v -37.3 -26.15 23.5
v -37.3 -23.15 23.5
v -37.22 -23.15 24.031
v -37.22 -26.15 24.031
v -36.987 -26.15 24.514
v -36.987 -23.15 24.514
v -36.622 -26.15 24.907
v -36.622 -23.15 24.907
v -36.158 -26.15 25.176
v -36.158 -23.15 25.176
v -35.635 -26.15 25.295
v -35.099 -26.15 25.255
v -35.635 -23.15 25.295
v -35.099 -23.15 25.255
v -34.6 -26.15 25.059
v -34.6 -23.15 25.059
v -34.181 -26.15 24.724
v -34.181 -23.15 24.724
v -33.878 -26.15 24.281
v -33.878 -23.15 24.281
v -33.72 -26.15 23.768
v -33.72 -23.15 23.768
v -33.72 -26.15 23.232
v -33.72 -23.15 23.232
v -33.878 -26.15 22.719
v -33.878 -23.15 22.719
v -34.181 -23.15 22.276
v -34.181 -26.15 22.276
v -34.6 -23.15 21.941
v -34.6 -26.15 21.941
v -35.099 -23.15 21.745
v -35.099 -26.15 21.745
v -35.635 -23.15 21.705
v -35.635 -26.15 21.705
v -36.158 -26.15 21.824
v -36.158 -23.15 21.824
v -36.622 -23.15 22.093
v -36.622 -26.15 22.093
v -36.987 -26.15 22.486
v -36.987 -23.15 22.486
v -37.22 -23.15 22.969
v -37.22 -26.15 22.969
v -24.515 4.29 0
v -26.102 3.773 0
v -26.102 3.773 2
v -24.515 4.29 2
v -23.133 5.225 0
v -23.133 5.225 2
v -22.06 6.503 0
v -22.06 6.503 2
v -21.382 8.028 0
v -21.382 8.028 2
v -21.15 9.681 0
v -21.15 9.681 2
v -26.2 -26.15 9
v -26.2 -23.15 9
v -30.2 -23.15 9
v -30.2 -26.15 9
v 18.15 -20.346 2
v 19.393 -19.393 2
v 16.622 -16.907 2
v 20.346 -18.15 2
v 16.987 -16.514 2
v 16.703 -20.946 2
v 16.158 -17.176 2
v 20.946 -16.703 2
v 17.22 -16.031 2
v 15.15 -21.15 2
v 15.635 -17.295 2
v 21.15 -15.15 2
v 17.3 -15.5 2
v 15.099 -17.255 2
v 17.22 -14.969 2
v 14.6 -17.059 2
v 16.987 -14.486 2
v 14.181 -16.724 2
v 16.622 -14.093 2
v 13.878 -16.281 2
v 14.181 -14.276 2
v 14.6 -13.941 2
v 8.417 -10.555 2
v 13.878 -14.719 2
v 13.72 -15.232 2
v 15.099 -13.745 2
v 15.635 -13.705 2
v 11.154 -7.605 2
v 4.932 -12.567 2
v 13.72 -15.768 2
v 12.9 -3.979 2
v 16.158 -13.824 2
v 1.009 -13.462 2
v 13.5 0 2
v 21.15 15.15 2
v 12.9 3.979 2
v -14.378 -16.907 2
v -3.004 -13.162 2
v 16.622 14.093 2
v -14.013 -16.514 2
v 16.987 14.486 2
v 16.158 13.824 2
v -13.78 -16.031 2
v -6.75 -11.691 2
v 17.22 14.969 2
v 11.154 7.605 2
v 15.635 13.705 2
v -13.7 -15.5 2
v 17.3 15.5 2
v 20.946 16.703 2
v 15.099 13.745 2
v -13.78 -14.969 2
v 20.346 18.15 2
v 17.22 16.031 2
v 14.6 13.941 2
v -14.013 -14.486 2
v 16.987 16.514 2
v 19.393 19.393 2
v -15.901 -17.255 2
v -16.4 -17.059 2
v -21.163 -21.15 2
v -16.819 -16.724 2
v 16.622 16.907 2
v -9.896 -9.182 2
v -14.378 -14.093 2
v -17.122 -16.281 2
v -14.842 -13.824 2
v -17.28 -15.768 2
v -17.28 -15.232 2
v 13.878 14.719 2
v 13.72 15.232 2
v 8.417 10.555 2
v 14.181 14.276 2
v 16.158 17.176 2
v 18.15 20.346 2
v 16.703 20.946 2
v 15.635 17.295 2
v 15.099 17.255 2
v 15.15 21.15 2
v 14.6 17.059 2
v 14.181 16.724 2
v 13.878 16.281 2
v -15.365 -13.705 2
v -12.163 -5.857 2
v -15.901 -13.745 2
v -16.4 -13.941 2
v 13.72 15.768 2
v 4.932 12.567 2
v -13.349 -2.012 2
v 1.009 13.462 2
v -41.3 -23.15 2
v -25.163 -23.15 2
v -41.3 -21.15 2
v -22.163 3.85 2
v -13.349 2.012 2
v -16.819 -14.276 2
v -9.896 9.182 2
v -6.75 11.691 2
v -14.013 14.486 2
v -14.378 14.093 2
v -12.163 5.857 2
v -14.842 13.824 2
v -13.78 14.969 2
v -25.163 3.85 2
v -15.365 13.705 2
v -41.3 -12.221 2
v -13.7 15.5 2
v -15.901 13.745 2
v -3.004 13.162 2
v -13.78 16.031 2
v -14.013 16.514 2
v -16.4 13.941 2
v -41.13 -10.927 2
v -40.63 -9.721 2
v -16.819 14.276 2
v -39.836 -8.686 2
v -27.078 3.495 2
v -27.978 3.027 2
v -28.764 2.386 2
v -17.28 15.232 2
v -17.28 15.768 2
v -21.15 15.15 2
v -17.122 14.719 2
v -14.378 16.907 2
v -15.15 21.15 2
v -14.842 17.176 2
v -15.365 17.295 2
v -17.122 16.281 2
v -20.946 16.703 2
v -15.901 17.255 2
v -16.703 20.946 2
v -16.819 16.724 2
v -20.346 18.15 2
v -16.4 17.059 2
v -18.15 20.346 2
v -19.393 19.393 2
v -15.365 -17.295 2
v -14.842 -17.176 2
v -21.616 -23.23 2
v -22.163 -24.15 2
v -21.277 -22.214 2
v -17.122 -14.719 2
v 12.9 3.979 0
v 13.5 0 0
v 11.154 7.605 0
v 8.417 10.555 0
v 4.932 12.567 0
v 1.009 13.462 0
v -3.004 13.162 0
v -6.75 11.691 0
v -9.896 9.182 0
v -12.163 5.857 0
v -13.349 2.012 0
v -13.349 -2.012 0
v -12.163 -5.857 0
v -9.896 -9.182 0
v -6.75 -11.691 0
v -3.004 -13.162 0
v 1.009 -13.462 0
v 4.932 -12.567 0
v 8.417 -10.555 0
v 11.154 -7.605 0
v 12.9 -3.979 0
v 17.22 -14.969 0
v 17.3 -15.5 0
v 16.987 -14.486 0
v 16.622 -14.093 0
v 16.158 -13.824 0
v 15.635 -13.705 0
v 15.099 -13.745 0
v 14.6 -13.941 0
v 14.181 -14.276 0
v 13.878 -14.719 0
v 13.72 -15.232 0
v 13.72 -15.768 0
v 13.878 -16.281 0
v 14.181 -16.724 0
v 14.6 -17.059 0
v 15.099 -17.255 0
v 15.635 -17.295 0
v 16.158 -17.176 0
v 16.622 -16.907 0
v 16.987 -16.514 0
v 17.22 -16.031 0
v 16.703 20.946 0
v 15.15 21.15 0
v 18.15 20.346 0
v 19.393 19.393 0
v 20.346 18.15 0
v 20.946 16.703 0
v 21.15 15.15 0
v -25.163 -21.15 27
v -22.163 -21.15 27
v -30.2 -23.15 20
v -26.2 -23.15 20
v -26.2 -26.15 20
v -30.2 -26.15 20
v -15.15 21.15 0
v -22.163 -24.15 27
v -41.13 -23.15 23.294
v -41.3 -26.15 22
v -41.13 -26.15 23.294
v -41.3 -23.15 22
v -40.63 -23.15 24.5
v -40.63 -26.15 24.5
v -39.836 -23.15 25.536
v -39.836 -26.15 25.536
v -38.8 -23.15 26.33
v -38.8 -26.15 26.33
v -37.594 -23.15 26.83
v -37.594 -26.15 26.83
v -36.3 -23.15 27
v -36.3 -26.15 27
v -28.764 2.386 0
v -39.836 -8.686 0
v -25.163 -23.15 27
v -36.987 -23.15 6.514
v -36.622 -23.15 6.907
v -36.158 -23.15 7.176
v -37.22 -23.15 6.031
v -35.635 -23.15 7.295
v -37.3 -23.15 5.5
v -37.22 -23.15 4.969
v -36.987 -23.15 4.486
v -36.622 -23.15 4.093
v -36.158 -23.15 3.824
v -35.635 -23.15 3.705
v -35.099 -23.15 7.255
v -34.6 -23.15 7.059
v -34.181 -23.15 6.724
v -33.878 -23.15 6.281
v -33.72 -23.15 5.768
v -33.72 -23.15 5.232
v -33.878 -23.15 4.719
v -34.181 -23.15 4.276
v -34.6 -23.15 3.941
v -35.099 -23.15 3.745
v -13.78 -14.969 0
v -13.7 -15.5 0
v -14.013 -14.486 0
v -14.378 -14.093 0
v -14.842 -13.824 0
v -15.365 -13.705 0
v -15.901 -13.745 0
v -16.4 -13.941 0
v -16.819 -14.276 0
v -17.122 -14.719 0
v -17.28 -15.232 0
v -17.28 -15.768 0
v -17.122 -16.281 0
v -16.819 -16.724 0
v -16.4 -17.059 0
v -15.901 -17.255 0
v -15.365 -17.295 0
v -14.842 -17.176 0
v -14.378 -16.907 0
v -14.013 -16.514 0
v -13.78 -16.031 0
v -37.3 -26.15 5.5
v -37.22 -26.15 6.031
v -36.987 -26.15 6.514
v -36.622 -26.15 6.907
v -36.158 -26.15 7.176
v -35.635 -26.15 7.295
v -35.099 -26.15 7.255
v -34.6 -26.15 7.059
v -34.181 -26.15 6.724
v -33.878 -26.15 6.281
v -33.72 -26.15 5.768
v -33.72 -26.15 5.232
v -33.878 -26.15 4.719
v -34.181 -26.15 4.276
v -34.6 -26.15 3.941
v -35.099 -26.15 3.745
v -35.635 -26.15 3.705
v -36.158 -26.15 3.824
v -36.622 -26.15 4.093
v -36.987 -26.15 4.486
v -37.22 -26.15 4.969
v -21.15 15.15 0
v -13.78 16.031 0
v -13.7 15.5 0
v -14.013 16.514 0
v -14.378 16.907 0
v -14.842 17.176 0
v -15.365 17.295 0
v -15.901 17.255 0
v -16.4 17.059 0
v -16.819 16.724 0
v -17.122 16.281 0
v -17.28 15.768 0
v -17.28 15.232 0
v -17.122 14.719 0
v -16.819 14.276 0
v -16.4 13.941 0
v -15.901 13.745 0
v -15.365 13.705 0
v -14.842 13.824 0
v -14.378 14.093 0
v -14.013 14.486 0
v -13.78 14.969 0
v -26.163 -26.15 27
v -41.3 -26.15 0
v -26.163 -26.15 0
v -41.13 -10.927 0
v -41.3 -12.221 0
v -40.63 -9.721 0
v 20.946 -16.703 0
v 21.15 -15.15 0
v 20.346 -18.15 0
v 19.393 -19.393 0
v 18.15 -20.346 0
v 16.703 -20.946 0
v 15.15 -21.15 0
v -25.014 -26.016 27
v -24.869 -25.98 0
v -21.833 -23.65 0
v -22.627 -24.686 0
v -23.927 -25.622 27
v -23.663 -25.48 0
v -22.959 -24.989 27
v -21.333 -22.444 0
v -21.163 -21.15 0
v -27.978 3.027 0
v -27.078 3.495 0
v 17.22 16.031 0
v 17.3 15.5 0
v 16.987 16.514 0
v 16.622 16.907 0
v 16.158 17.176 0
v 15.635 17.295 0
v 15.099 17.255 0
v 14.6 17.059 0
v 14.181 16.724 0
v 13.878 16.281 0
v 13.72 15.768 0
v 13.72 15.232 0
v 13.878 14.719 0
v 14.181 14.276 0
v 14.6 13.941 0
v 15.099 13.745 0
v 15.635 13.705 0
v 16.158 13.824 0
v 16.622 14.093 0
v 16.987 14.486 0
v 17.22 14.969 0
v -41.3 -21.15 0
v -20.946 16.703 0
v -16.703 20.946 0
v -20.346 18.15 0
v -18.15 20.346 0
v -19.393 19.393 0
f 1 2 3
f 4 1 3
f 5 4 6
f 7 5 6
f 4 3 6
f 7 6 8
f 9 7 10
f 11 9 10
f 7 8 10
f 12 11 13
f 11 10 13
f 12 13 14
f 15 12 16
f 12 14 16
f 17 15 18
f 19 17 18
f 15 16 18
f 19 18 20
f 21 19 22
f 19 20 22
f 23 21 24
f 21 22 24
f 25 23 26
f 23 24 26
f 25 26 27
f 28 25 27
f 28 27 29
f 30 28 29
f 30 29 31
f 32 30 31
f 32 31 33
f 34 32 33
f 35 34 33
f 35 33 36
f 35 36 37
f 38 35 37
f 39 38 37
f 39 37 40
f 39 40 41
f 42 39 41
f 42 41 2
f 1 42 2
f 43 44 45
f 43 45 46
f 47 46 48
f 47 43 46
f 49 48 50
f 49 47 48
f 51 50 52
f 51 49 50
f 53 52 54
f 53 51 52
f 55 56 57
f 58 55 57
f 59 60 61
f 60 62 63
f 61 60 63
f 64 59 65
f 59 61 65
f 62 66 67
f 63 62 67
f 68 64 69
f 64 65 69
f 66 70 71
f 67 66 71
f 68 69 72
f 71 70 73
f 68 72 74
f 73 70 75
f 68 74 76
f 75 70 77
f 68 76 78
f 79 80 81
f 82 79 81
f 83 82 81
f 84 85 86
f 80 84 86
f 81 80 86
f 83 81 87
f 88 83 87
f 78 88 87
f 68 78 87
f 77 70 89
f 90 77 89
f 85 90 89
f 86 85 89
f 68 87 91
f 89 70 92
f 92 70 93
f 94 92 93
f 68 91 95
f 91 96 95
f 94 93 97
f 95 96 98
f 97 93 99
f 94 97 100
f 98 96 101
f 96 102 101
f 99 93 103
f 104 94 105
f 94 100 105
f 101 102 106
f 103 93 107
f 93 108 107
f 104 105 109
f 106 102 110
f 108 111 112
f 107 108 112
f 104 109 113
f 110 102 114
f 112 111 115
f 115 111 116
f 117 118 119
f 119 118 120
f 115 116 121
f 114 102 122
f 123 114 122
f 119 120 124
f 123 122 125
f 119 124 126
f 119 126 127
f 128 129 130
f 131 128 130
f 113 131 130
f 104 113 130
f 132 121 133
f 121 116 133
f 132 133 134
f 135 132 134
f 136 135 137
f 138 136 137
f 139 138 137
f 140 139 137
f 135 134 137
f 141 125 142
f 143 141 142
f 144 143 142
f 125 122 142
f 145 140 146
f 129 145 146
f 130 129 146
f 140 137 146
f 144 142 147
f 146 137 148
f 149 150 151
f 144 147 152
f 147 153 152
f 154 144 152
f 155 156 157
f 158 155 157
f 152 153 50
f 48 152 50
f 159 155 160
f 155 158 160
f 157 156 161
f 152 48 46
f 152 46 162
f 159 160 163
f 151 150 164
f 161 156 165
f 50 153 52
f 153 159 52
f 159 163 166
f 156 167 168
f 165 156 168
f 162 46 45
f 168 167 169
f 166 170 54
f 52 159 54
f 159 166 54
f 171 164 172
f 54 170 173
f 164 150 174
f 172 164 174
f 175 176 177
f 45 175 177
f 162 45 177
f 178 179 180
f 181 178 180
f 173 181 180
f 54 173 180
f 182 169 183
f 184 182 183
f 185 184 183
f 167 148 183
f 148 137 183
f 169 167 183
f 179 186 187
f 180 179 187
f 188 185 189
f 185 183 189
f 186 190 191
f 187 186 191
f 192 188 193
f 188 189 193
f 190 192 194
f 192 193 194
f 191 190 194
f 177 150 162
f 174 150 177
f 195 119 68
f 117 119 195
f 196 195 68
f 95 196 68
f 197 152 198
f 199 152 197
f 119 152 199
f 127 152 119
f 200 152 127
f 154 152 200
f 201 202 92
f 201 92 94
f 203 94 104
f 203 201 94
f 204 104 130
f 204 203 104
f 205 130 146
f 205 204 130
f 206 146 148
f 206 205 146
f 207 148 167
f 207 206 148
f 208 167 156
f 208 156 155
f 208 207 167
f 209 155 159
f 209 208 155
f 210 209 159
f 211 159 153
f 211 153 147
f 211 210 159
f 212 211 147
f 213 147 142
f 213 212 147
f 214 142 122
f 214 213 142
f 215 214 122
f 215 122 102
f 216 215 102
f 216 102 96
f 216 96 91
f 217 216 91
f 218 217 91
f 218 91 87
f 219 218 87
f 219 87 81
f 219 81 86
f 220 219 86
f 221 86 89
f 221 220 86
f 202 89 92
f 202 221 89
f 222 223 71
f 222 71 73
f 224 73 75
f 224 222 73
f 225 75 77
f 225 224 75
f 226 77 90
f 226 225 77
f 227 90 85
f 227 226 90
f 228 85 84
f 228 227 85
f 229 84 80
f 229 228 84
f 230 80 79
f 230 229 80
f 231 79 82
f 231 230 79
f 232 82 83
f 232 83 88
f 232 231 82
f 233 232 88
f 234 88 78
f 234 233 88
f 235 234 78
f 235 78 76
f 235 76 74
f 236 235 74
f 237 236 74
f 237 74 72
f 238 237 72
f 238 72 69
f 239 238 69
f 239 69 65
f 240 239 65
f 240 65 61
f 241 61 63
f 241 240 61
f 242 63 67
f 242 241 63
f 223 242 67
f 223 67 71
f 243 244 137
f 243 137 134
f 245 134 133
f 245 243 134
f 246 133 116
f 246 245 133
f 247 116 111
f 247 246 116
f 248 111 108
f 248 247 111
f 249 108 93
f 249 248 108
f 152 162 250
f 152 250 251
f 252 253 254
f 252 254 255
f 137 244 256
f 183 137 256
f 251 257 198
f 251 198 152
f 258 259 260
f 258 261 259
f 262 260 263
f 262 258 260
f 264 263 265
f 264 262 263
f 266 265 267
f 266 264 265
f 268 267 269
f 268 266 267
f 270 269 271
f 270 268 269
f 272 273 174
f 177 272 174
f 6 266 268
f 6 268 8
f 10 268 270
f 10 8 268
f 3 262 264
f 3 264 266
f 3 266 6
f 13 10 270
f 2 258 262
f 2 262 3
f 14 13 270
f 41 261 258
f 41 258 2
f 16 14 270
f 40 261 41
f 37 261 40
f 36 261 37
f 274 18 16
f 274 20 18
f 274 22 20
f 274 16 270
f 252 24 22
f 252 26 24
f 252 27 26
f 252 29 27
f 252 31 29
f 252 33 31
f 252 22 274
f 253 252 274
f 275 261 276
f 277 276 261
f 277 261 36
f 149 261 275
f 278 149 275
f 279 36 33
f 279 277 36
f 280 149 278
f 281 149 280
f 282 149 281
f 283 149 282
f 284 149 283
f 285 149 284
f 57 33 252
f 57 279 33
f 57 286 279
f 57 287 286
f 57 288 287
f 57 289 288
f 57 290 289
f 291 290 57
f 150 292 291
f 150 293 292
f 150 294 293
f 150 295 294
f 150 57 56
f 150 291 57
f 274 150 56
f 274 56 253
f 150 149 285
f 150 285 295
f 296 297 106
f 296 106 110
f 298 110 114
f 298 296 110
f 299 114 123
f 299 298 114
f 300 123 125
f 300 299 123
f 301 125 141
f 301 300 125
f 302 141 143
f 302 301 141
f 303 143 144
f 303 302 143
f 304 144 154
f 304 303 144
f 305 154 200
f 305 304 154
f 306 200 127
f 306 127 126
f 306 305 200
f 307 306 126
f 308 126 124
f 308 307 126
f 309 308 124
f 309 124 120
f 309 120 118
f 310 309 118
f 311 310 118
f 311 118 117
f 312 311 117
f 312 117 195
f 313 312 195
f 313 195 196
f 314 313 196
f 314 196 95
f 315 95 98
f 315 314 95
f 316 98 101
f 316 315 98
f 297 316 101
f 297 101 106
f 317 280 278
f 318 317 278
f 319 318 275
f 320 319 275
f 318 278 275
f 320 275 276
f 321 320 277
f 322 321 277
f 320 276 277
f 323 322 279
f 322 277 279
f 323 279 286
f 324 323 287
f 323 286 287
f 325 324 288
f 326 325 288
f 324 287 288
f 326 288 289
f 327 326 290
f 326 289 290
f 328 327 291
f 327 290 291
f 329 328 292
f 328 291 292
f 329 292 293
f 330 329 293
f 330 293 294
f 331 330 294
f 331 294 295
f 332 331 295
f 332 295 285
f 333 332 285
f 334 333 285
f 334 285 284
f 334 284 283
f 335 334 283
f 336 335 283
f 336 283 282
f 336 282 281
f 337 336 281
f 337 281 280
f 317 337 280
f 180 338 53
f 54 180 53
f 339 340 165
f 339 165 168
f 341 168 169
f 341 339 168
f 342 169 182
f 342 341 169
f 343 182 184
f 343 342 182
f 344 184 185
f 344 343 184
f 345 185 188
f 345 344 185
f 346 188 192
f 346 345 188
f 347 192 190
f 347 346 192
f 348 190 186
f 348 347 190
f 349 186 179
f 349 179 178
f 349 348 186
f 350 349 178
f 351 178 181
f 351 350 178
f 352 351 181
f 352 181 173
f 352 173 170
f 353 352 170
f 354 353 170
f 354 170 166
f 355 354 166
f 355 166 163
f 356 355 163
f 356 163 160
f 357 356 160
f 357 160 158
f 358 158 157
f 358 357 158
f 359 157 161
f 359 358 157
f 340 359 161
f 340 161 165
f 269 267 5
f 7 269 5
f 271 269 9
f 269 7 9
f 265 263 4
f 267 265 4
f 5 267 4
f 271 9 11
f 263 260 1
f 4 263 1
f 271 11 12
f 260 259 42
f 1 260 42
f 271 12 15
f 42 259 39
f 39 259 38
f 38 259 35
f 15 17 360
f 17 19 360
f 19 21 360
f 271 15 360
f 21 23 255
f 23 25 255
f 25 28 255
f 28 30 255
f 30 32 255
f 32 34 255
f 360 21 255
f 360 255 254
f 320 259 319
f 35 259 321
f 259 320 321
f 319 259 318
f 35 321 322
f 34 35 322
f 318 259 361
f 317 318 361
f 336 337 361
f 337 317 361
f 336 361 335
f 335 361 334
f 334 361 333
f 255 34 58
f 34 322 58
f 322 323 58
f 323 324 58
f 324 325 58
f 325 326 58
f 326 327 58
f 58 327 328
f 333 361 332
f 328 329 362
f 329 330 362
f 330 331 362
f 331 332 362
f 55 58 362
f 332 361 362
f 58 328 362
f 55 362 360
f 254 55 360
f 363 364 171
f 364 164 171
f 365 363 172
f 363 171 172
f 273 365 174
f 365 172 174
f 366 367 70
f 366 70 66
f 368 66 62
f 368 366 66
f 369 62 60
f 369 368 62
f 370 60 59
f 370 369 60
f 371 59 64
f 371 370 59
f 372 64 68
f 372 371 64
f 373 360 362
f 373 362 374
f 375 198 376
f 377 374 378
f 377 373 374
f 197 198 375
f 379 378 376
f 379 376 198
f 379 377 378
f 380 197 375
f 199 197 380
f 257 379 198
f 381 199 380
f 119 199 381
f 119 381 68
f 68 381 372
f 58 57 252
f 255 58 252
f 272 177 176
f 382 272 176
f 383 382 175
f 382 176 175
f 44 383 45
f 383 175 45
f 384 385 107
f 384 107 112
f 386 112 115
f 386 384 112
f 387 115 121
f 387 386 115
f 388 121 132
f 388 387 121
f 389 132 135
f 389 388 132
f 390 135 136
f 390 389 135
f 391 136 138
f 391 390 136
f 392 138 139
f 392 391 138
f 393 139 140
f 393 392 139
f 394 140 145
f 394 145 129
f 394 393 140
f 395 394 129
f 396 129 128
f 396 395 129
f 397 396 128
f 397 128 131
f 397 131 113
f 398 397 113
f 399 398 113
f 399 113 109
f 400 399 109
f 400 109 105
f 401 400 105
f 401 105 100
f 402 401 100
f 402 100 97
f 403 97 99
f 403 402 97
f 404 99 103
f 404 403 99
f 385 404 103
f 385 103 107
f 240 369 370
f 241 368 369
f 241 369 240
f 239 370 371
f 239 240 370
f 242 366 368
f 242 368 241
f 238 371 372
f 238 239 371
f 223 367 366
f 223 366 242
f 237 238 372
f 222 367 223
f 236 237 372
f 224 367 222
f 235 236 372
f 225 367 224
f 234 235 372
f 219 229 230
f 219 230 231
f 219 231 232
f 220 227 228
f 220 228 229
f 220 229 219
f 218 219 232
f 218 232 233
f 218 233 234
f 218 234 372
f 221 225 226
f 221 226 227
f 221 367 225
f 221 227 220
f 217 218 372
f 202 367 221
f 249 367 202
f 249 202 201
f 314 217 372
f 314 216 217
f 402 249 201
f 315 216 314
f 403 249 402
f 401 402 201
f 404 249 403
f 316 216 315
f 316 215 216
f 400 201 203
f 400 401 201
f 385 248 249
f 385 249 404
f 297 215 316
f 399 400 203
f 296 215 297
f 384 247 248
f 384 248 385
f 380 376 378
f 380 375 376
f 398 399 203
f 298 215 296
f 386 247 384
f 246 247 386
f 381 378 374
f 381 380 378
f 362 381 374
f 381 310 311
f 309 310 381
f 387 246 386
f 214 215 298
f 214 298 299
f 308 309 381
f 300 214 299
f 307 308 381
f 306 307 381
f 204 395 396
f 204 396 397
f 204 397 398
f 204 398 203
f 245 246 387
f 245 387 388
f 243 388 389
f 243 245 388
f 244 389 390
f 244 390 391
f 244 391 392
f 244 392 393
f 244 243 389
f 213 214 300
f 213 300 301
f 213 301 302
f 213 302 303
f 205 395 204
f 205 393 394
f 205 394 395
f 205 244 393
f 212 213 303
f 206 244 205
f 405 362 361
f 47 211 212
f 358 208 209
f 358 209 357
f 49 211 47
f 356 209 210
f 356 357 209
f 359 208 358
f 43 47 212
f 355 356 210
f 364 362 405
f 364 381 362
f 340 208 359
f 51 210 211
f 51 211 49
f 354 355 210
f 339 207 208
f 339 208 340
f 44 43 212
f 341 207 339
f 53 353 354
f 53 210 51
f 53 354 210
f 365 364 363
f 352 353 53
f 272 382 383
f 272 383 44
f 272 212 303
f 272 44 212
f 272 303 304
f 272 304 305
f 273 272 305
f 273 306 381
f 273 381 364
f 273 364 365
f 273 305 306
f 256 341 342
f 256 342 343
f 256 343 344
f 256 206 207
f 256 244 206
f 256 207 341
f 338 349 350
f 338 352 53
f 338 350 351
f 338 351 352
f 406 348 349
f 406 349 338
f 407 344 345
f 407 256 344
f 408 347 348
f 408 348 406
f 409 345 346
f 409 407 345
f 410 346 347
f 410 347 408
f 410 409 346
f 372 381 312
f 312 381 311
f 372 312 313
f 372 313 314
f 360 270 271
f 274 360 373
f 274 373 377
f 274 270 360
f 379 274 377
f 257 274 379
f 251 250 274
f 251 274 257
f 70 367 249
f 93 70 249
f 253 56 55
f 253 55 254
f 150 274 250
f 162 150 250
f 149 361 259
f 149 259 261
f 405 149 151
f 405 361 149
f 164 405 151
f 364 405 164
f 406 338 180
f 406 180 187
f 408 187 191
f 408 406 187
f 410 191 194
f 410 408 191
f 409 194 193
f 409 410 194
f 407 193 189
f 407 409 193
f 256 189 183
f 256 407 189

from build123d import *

# Parameters (mm, degrees)
F0_R         = 1.8
F0_R_2       = 13.5
F0_W         = 20.1372796029
F0_H         = 5
F1_DEPTH     = 2
F2_W         = 3
F2_H         = 30
F3_DEPTH     = 27
F4_W         = 16.1372796029
F4_H         = 3
F5_DEPTH     = 25
F6_R         = 1.8
F6_W         = 4
F6_H         = 11
F7_DEPTH     = 25
F8_SIZE      = 25
F9_SIZE      = 14
F10_R        = 4.99999
F11_T1_DEPTH = 2
F11_T3_DEPTH = 32


# Not quite as in the source:
# - a fillet or chamfer that OpenCascade refuses, or shapes differently, is made with other operations: its cross-section is extruded or revolved along the edge and cut away or added
# - a fillet or chamfer is up to 0.001 mm smaller than in the source, because OpenCascade refuses the exact size
# - a feature names something its author has since deleted; it is built from what else it names


with BuildPart() as f1:
    # F0 (on Top) → F1 (new body)
    with BuildSketch(Plane.XY):
        Polygon((21.15, -21.15), (21.15, 21.15), (-21.15, 21.15), (-21.15, 3.85), (-21.15, -21.15), align=None)
        with Locations((-15.5, -15.5)):
            Circle(F0_R, mode=Mode.SUBTRACT)
        with Locations((15.5, -15.5)):
            Circle(F0_R, mode=Mode.SUBTRACT)
        with Locations((-15.5, 15.5)):
            Circle(F0_R, mode=Mode.SUBTRACT)
        Circle(F0_R_2, mode=Mode.SUBTRACT)
        with Locations((15.5, 15.5)):
            Circle(F0_R, mode=Mode.SUBTRACT)
        Polygon((-21.15, -21.15), (-21.15, 3.85), (-41.3, 3.85), (-41.3, -21.15), (-21.1627203971, -21.15), align=None)
        with Locations((-31.2313601986, -23.65)):
            Rectangle(F0_W, F0_H)
    extrude(amount=F1_DEPTH)

    # F2 (on Top) → F3 (join)
    with BuildSketch(Plane.XY):
        with Locations((-23.6627203971, -11.15)):
            Rectangle(F2_W, F2_H)
    extrude(amount=F3_DEPTH)

    # F4 (on face) → F5 (join)
    with BuildSketch(Plane.XY.offset(2)):
        with Locations((-33.2313601986, -24.65)):
            Rectangle(F4_W, F4_H)
    extrude(amount=F5_DEPTH)

    # F6 (on face) → F7 (cut)
    with BuildSketch(Plane(origin=(0, -23.15, 0), x_dir=(-1, 0, 0), z_dir=(0, 1, 0))):
        with Locations((35.5, 5.5)):
            Circle(F6_R)
        with Locations((35.5, 23.5)):
            Circle(F6_R)
        with Locations((28.2, 14.5)):
            Rectangle(F6_W, F6_H)
    extrude(amount=-F7_DEPTH, mode=Mode.SUBTRACT)

    # F8
    f8_edges = [f1.edges().sort_by_distance(p)[0] for p in [
        (-23.66272, 3.85, 27),
    ]]
    chamfer(f8_edges, length=F8_SIZE)

    # F9
    f9_edges = [f1.edges().sort_by_distance(p)[0] for p in [
        (-41.3, 3.85, 1),
    ]]
    chamfer(f9_edges, length=F9_SIZE)

    # F10 (radius 5 in the source; OpenCascade refuses exactly that, so slightly less here)
    f10_edges = [f1.edges().sort_by_distance(p)[0] for p in [
        (-41.3, -10.15, 1),
        (-27.3, 3.85, 1),
        (-21.16272, -26.15, 1),
        (-41.3, -24.65, 27),
    ]]
    fillet(f10_edges, radius=F10_R)

    # F11: fillet of radius 6 on 4 edges, made by hand

    # F11_s2 → F11_t1 (join)
    with BuildSketch(Plane.XY):
        with BuildLine():
            ThreePointArc((-26.1021461366, 3.7731598692), (-22.5517871308, 5.8265464621), (-21.15, 9.6809515277))
            Line((-21.15, 9.6809515277), (-20.55, 9.6809515277))
            Line((-20.55, 9.6809515277), (-20.55, 3.85))
            Line((-20.55, 3.85), (-21.15, 3.25))
            ThreePointArc((-21.15, 3.25), (-25.2289363303, 3.25), (-25.9973607503, 3.1823807033))
            Line((-25.9973607503, 3.1823807033), (-26.1021461366, 3.7731598692))
        make_face()
    extrude(amount=F11_T1_DEPTH)

    # F11_s4 → F11_t3 (cut)
    with BuildSketch(Plane.XY.offset(-15)):
        with BuildLine():
            ThreePointArc((21.15, -15.15), (19.3926406871, -19.3926406871), (15.15, -21.15))
            Line((15.15, -21.15), (21.15, -21.15))
            Line((21.15, -21.15), (21.15, -15.15))
        make_face()
        with BuildLine():
            ThreePointArc((15.15, 21.15), (19.3926406871, 19.3926406871), (21.15, 15.15))
            Line((21.15, 15.15), (21.15, 21.15))
            Line((21.15, 21.15), (15.15, 21.15))
        make_face()
        with BuildLine():
            ThreePointArc((-21.15, 15.15), (-19.3926406871, 19.3926406871), (-15.15, 21.15))
            Line((-15.15, 21.15), (-21.15, 21.15))
            Line((-21.15, 21.15), (-21.15, 15.15))
        make_face()
    extrude(amount=F11_T3_DEPTH, mode=Mode.SUBTRACT)


solid = f1.part
